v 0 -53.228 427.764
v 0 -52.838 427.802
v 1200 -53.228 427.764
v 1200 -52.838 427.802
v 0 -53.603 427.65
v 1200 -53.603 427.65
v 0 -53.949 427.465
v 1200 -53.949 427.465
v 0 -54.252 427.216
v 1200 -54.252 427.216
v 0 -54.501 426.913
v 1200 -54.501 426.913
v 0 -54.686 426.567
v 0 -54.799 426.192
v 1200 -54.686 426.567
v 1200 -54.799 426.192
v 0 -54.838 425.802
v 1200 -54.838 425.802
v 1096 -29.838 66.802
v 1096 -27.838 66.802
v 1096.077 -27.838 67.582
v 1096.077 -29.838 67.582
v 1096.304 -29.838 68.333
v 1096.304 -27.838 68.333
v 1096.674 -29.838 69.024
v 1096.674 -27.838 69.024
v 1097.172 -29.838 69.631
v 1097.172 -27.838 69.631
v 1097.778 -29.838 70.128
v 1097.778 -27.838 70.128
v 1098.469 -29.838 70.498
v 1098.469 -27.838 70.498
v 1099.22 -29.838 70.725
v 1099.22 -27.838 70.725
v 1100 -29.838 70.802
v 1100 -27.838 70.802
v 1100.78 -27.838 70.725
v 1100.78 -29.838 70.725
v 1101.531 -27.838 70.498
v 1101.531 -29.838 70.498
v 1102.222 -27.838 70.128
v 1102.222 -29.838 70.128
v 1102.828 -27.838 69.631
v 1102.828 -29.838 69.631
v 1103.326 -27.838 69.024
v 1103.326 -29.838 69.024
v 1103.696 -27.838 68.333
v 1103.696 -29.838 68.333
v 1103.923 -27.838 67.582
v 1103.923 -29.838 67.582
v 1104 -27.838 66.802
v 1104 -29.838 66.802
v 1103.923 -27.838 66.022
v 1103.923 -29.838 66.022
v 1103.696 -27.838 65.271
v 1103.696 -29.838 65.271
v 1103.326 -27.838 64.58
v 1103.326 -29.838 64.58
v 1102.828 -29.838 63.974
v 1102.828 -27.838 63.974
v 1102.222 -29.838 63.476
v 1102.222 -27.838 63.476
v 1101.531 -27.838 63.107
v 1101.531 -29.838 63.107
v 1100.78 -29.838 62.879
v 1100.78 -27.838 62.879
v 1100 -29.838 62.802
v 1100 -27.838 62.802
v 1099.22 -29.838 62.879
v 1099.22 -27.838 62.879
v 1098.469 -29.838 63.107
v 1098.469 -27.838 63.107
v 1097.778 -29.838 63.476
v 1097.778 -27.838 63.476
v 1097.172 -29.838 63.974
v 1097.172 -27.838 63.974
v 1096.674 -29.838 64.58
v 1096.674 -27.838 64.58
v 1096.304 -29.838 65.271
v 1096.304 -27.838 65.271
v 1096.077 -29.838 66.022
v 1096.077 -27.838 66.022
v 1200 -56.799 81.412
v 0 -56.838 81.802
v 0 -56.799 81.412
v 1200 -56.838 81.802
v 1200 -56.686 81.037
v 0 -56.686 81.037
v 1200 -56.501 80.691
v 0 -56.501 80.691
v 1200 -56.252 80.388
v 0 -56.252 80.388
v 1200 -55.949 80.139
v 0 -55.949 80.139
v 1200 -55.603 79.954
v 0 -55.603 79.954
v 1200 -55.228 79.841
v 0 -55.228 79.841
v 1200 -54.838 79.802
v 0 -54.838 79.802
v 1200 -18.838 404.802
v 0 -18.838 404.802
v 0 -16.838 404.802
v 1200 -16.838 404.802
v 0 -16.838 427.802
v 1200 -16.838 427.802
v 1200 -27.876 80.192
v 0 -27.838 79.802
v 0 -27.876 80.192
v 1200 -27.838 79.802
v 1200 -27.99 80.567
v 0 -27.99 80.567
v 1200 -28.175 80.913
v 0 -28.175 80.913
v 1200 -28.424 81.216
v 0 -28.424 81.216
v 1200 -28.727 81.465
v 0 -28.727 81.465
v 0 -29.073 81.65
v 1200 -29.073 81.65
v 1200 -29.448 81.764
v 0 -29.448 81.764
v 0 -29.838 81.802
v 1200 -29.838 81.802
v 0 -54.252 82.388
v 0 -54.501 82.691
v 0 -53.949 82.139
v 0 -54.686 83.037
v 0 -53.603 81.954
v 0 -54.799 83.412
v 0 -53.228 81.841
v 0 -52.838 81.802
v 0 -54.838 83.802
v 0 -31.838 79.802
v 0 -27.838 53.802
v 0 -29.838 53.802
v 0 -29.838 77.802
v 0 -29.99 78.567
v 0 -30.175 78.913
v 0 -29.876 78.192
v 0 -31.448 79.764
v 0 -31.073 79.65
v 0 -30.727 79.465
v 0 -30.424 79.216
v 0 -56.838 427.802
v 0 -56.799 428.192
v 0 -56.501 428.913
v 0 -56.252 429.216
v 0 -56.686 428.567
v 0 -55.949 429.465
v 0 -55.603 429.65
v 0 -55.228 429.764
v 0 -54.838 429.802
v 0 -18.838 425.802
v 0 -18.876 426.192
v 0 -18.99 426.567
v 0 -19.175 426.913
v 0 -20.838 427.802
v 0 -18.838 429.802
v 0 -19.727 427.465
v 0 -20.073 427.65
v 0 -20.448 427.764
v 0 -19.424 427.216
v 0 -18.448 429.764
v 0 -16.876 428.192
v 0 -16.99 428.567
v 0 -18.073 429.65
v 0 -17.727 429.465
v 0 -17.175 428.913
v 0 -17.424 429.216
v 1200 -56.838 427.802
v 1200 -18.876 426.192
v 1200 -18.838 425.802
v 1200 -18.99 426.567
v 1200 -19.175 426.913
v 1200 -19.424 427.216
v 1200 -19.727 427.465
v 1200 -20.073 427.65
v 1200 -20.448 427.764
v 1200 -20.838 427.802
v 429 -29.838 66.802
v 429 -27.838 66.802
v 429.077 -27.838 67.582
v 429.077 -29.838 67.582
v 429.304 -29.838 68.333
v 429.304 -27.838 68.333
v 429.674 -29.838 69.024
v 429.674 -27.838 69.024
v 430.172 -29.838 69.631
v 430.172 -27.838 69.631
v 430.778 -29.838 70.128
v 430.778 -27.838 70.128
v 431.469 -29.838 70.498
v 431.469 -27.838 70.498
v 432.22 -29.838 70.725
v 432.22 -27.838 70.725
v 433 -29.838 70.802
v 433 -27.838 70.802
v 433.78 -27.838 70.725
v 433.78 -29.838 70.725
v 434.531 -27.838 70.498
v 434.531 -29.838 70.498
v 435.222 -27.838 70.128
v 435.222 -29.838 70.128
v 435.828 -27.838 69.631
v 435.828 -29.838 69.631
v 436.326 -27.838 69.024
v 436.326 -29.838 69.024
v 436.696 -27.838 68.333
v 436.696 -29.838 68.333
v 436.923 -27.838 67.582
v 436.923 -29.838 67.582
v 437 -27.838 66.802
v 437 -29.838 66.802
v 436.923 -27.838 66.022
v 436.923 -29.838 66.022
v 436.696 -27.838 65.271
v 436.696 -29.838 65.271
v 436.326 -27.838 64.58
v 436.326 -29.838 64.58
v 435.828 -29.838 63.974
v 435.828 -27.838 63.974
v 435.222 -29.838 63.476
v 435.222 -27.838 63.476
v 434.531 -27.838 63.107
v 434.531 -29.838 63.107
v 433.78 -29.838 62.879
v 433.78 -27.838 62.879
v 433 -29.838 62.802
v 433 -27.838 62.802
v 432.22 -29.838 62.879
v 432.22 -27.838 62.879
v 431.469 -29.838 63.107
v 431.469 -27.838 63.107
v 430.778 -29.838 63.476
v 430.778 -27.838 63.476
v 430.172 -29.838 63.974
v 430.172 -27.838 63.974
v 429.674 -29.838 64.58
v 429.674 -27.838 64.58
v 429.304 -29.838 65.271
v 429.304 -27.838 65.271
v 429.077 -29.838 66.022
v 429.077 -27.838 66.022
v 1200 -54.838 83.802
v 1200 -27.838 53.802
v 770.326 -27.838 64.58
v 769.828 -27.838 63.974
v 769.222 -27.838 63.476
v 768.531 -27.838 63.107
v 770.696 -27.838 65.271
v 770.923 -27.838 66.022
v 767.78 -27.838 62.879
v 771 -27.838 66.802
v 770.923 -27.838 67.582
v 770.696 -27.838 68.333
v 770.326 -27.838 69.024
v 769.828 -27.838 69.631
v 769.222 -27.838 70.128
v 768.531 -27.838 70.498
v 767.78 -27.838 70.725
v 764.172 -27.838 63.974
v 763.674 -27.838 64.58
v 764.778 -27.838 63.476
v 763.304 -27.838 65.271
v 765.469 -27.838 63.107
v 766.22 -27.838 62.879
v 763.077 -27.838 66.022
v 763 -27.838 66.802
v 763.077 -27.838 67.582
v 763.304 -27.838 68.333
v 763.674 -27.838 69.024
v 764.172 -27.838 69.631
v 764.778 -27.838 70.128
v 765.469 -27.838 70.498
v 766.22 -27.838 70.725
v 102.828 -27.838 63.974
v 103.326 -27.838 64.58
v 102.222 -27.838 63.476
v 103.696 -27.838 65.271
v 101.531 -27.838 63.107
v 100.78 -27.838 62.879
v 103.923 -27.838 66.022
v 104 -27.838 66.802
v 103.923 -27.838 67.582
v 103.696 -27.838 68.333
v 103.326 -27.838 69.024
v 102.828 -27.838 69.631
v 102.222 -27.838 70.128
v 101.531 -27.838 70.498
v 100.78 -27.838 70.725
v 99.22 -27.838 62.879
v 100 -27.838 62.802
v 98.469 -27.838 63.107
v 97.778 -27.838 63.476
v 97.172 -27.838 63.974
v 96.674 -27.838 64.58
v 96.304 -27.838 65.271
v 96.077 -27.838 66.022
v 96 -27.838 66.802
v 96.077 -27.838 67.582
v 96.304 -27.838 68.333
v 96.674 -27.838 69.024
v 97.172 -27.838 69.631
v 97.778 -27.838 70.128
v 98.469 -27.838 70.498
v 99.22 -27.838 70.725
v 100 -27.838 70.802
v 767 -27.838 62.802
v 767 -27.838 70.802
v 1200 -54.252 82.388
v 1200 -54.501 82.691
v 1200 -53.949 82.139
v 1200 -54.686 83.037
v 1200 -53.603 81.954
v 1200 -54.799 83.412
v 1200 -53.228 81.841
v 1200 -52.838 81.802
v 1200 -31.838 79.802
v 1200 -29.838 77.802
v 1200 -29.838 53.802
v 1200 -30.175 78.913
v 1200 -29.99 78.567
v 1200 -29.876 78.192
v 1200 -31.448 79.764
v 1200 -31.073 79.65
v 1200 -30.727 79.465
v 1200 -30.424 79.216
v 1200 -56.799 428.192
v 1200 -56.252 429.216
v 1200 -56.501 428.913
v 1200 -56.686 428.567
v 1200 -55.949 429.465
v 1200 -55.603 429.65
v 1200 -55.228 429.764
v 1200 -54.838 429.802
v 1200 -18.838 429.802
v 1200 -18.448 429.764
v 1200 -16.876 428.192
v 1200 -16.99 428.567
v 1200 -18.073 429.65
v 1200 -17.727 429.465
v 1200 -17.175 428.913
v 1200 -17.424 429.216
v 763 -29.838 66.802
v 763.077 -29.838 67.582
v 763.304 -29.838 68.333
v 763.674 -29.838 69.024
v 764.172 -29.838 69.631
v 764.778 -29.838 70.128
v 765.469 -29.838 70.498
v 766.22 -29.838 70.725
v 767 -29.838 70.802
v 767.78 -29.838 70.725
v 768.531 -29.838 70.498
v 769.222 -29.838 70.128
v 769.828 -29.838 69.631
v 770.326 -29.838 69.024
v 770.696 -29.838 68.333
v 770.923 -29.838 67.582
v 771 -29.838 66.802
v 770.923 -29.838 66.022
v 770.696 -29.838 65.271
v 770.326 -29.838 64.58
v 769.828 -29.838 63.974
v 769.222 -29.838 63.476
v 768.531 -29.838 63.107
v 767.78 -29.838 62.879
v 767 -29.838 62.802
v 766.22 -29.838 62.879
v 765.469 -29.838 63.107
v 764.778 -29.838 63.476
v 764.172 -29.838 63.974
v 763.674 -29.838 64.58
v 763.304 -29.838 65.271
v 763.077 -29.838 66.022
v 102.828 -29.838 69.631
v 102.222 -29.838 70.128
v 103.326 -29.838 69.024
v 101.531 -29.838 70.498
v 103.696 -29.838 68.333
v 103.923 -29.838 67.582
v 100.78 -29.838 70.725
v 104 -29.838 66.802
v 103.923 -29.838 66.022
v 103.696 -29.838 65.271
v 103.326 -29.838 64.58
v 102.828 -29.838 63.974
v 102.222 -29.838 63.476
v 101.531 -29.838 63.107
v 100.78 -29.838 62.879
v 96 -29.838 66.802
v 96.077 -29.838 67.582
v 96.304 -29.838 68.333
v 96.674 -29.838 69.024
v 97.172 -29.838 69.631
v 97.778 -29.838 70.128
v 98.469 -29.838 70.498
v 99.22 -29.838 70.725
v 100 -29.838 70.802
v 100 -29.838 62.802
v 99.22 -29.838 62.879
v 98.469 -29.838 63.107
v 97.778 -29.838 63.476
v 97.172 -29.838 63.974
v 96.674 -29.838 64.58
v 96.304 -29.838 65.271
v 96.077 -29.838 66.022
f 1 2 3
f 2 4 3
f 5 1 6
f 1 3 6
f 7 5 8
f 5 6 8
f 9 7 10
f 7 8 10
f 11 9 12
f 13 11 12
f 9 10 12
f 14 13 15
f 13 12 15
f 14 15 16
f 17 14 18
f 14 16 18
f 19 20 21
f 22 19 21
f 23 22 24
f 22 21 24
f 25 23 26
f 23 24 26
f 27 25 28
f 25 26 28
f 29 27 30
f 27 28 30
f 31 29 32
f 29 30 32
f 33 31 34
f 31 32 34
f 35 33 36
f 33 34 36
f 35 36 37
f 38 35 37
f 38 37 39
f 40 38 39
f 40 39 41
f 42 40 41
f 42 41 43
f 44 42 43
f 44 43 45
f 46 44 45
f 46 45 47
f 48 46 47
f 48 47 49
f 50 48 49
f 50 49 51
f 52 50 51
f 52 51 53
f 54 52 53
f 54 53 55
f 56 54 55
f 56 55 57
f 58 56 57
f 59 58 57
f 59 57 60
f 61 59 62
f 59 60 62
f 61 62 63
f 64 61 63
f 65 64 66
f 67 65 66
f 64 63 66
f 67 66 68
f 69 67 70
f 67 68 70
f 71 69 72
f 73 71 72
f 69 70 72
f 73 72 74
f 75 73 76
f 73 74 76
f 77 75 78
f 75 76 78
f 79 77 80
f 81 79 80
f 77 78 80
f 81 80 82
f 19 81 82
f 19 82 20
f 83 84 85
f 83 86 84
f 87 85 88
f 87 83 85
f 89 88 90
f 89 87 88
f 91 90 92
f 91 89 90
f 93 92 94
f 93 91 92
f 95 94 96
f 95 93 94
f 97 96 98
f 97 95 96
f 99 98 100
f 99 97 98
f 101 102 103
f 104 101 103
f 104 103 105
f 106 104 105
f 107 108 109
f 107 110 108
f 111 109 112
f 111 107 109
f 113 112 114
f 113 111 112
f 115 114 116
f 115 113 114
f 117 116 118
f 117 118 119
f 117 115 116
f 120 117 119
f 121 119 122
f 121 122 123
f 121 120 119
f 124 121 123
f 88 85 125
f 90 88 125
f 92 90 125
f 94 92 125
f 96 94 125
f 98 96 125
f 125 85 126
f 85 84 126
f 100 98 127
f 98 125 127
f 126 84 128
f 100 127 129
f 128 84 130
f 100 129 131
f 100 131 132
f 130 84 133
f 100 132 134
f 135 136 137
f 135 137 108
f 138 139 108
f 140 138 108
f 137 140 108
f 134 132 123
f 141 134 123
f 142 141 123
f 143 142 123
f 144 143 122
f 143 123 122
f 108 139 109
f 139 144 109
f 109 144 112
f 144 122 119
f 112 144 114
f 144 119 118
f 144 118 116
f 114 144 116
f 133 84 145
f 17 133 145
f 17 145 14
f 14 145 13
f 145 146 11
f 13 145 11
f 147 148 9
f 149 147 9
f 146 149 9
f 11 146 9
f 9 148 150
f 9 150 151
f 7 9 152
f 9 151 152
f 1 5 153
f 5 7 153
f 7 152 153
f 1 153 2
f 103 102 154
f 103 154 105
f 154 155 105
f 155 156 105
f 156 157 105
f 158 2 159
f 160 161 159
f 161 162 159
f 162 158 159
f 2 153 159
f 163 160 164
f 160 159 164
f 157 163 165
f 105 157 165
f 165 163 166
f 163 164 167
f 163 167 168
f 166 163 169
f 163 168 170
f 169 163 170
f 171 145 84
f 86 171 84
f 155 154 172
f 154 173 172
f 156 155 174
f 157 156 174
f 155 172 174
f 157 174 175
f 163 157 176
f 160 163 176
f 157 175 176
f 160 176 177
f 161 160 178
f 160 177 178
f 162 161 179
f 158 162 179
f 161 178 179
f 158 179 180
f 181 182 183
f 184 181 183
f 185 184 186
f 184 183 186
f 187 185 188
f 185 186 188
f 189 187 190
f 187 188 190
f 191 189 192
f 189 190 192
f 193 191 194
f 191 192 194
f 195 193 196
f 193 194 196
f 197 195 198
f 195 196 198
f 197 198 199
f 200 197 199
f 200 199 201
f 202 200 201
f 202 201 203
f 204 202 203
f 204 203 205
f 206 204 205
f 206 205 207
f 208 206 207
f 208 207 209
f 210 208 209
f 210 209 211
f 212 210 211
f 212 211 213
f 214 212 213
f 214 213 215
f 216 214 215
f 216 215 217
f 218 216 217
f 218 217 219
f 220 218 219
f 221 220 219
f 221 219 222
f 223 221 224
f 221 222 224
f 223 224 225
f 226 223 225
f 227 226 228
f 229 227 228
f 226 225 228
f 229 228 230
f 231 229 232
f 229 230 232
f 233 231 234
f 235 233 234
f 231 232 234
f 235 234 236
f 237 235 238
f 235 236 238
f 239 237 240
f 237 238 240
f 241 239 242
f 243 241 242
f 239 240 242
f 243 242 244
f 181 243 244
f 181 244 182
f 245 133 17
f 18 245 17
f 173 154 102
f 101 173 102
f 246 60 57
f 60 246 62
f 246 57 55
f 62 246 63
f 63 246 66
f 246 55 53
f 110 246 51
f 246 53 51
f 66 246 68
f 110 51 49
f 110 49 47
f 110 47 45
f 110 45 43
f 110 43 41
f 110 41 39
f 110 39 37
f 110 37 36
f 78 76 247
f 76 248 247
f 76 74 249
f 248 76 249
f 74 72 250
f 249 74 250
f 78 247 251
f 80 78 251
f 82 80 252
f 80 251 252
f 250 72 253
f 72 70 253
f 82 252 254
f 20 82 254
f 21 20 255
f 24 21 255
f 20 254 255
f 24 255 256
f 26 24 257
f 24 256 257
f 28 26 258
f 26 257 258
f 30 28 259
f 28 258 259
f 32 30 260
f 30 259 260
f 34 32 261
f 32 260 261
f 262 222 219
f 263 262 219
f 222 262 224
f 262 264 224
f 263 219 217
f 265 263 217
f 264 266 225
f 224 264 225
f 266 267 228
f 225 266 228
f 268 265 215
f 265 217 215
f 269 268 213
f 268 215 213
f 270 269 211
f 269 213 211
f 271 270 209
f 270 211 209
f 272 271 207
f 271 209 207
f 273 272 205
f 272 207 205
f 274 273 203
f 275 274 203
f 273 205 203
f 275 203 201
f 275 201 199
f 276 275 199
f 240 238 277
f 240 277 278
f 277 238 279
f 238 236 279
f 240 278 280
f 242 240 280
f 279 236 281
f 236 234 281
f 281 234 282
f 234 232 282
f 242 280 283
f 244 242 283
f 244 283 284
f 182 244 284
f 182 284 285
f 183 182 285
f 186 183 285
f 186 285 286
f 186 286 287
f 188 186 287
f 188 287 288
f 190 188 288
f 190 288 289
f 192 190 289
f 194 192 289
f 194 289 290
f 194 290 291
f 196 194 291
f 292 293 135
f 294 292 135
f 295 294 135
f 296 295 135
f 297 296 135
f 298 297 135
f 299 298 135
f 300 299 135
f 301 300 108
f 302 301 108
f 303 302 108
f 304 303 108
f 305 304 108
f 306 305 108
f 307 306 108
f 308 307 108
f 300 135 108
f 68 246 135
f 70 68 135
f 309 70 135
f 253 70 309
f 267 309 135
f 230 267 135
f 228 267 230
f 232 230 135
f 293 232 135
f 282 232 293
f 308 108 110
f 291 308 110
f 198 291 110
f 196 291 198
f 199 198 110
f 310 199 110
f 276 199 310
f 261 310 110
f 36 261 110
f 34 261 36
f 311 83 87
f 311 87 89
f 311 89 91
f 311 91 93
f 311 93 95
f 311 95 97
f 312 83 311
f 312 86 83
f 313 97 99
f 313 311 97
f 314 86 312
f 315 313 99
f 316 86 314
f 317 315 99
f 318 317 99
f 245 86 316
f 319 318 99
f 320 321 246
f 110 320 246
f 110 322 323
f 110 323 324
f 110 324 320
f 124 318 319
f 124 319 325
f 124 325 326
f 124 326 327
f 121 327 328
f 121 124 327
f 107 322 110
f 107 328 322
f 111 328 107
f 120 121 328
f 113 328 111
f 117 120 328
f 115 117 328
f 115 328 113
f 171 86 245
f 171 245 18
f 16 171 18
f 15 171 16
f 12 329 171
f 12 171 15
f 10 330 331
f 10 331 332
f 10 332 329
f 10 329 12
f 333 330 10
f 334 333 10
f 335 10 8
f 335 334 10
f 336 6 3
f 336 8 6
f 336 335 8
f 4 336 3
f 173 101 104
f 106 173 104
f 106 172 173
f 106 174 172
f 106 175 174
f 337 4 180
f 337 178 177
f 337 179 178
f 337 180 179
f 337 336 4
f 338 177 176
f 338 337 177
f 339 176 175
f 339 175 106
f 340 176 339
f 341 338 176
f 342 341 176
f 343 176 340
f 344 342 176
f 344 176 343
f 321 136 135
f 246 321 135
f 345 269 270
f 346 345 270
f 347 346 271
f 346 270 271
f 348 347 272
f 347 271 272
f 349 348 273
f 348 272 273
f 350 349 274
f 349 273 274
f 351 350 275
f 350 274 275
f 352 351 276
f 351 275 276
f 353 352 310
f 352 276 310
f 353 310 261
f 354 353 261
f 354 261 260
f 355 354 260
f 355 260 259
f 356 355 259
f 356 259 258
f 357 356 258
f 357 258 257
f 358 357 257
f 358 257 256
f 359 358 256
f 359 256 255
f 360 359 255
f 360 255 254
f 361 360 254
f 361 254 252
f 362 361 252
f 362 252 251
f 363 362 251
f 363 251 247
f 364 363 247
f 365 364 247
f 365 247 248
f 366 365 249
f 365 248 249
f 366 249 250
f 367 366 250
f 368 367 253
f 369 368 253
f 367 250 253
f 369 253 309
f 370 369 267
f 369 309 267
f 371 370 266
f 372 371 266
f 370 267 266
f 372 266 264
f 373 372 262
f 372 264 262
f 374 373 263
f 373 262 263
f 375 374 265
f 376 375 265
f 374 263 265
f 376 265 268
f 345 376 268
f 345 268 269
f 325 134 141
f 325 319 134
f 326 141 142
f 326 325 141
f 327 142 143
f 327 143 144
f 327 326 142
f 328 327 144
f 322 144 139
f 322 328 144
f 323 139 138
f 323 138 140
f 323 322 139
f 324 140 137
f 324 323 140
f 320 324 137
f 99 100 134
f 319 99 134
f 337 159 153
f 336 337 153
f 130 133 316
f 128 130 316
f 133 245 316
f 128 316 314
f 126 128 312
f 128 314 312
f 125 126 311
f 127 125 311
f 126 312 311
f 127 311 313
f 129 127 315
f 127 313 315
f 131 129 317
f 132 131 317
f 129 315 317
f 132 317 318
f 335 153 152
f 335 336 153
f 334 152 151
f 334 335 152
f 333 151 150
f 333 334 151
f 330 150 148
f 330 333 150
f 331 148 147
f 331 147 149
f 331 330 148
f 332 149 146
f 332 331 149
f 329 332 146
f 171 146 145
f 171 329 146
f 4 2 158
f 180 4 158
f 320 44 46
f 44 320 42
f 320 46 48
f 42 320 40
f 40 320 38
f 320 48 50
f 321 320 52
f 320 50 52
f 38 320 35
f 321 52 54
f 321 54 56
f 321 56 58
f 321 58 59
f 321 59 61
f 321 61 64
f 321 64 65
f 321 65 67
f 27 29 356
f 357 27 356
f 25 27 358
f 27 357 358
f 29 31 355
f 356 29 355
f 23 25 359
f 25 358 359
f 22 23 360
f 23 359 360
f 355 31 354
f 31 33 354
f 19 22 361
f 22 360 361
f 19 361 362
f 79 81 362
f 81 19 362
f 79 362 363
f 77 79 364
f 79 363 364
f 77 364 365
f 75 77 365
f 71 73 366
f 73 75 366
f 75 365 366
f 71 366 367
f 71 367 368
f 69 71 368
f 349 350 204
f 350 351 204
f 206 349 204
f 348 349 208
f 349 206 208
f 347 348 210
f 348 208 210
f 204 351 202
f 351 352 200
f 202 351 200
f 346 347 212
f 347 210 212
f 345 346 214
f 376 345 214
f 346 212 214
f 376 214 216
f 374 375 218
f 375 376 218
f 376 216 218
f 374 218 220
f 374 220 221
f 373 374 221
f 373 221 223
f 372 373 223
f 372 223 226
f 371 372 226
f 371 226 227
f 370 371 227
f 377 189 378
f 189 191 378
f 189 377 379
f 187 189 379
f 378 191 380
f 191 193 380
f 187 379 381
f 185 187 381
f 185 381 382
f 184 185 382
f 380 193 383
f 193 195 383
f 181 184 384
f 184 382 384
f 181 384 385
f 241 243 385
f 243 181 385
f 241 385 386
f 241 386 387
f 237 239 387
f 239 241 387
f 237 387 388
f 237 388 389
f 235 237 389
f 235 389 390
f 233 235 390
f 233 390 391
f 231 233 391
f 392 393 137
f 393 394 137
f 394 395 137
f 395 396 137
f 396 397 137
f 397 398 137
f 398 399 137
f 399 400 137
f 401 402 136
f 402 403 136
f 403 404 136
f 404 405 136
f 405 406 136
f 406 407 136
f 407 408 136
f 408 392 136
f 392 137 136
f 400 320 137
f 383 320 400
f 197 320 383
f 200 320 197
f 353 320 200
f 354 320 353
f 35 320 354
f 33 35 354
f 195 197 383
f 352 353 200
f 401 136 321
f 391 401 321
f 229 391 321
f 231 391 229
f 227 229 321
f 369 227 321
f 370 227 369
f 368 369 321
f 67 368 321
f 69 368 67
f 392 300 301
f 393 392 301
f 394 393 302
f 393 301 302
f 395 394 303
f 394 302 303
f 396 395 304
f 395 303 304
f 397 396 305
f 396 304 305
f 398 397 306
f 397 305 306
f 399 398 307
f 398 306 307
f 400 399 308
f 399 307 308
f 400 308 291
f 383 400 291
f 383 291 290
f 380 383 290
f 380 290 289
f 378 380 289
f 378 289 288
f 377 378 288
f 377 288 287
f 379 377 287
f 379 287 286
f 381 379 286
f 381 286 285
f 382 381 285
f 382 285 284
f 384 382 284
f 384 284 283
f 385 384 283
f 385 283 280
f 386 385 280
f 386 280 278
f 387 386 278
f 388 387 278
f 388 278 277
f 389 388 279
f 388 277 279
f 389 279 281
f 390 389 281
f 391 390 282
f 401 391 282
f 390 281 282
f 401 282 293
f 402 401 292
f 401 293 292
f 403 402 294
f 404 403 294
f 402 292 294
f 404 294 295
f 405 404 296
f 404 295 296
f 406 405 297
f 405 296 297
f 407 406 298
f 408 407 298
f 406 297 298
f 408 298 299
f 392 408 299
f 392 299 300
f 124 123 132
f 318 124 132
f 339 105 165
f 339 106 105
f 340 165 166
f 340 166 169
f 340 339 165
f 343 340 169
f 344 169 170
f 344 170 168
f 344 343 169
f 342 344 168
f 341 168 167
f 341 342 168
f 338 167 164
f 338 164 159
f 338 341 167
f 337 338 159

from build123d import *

# Parameters (mm, degrees)
F1_DEPTH = 1200
F3_D     = 8
F4_R     = 2


# Not quite as in the source:
# - a feature names something its author has since deleted; it is built from what else it names


with BuildPart() as f1:
    # F0 (on Right) → F1 (new body)
    with BuildSketch(Plane.YZ):
        Polygon((-18.8378913403, 427.8021101952), (-18.8378913403, 404.8021101952), (-16.8378913403, 404.8021101952), (-16.8378913403, 429.8021101952), (-56.8378913403, 429.8021101952), (-56.8378913403, 79.8021101952), (-29.8378913403, 79.8021101952), (-29.8378913403, 53.8021101952), (-27.8378913403, 53.8021101952), (-27.8378913403, 81.8021101952), (-54.8378913403, 81.8021101952), (-54.8378913403, 427.8021101952), align=None)
    extrude(amount=F1_DEPTH)

    # F3 (through all)
    with Locations(Plane.XZ.offset(29.8378913403)):
        with Locations((433, 66.8021101952), (767, 66.8021101952), (1100, 66.8021101952), (100, 66.8021101952)):
            Hole(F3_D / 2)

    # F4
    f4_edges = [f1.edges().sort_by_distance(p)[0] for p in [
        (600, -56.837891, 429.80211),
        (600, -16.837891, 429.80211),
        (600, -56.837891, 79.80211),
        (600, -27.837891, 81.80211),
        (600, -54.837891, 81.80211),
        (600, -29.837891, 79.80211),
        (600, -18.837891, 427.80211),
        (600, -54.837891, 427.80211),
    ]]
    fillet(f4_edges, radius=F4_R)


solid = f1.part
